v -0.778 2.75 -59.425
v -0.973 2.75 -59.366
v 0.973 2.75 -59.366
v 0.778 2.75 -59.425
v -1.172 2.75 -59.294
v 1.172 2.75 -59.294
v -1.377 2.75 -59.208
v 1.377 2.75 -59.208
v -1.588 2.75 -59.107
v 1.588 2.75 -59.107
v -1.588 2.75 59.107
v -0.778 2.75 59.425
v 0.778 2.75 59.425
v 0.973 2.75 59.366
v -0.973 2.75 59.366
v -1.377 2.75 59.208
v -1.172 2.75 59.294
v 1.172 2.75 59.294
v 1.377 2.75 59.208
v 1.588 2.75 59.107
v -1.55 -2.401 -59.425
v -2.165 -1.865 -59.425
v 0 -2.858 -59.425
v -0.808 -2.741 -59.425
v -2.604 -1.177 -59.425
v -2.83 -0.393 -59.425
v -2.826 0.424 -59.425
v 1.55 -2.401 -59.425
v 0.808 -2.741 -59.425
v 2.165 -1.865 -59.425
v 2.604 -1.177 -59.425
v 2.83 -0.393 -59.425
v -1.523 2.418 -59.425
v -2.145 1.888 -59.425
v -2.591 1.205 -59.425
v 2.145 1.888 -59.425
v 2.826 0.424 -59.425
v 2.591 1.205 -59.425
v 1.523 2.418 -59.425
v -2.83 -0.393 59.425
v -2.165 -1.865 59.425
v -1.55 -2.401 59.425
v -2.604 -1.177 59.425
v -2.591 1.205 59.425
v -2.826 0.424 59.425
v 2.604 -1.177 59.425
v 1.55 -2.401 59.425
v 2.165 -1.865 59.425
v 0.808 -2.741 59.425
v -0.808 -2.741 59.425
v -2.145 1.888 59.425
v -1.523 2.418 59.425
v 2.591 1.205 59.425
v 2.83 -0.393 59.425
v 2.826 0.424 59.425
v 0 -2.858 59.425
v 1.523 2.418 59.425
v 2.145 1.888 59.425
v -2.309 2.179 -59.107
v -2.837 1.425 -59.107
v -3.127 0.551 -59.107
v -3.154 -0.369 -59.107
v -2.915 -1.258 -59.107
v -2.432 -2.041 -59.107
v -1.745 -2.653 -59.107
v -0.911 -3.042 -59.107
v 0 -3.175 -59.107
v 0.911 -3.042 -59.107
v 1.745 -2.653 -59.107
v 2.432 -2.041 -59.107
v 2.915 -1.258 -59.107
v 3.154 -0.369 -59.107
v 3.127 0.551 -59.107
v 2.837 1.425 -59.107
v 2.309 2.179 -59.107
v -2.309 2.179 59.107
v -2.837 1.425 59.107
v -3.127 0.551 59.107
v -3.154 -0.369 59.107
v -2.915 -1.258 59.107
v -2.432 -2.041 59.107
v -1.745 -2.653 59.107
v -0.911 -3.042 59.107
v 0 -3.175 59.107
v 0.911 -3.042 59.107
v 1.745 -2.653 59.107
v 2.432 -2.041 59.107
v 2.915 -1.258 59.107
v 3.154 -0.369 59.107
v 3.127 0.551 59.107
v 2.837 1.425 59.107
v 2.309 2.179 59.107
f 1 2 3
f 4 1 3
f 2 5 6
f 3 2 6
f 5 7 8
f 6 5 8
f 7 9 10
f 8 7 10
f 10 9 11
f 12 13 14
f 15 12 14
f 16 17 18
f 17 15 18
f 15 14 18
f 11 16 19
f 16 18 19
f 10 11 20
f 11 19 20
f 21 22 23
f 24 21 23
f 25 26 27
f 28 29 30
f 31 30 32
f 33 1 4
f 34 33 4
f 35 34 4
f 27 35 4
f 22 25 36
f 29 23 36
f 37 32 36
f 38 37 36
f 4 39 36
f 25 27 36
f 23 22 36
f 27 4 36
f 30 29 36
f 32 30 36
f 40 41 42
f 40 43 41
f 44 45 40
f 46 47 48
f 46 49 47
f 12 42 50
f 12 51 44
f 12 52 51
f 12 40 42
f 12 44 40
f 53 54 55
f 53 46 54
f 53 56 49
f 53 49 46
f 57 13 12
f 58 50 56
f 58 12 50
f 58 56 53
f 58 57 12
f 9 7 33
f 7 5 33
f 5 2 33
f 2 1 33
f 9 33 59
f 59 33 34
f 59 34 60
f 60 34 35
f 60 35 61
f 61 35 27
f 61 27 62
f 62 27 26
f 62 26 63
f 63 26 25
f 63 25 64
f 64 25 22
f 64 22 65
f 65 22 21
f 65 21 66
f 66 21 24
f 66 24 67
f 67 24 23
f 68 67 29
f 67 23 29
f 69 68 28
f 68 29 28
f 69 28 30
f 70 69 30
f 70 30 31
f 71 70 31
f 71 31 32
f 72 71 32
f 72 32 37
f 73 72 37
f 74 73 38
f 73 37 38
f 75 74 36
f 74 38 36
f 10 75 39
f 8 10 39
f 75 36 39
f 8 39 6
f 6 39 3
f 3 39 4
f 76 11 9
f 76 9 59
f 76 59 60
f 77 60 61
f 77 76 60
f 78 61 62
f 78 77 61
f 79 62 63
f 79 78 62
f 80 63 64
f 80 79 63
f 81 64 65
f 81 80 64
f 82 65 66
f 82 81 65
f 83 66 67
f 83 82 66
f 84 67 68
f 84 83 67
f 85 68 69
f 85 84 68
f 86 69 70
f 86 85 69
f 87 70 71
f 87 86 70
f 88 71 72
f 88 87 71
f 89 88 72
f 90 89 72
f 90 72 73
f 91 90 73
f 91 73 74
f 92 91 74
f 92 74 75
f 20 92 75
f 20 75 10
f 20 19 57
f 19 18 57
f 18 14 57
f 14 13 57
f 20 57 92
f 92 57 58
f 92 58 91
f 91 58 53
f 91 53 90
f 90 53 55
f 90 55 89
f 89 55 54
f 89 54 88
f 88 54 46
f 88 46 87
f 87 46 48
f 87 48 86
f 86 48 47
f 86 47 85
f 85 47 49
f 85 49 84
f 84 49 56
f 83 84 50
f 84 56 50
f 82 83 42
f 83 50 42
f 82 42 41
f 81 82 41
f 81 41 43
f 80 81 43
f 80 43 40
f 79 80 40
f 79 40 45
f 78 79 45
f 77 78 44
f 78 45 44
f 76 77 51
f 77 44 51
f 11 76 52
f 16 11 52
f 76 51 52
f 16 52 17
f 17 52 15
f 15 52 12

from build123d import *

# Parameters (mm, degrees)
SKETCH3_R                = 3.175
BOSS_EXTRUDE2_DEPTH      = 59.425
BOSS_EXTRUDE2_DEPTH_BACK = 59.425
CUT_EXTRUDE5_DEPTH       = 60.425
CUT_EXTRUDE5_DEPTH_BACK  = 60.425
CHAMFER1_SIZE            = 0.3175


with BuildPart() as part:
    # Sketch3 → Boss-Extrude2 (new body, two sides)
    with BuildSketch(Plane.XY) as boss_extrude2_sk:
        Circle(SKETCH3_R)
    extrude(amount=BOSS_EXTRUDE2_DEPTH)
    extrude(boss_extrude2_sk.sketch, amount=-BOSS_EXTRUDE2_DEPTH_BACK)

    # Sketch10 → Cut-Extrude5 (cut, two sides)
    with BuildSketch(Plane.XY) as cut_extrude5_sk:
        with BuildLine():
            Line((-1.5875, 2.749630657), (1.5875, 2.749630657))
            ThreePointArc((1.5875, 2.749630657), (0, 3.175), (-1.5875, 2.749630657))
        make_face()
    extrude(amount=CUT_EXTRUDE5_DEPTH, mode=Mode.SUBTRACT)
    extrude(cut_extrude5_sk.sketch, amount=-CUT_EXTRUDE5_DEPTH_BACK, mode=Mode.SUBTRACT)

    # Chamfer1
    chamfer1_edges = [part.edges().sort_by_distance(p)[0] for p in [
        (0, -3.175, -59.425),
        (0, -3.175, 59.425),
    ]]
    chamfer(chamfer1_edges, length=CHAMFER1_SIZE)


solid = part.part
